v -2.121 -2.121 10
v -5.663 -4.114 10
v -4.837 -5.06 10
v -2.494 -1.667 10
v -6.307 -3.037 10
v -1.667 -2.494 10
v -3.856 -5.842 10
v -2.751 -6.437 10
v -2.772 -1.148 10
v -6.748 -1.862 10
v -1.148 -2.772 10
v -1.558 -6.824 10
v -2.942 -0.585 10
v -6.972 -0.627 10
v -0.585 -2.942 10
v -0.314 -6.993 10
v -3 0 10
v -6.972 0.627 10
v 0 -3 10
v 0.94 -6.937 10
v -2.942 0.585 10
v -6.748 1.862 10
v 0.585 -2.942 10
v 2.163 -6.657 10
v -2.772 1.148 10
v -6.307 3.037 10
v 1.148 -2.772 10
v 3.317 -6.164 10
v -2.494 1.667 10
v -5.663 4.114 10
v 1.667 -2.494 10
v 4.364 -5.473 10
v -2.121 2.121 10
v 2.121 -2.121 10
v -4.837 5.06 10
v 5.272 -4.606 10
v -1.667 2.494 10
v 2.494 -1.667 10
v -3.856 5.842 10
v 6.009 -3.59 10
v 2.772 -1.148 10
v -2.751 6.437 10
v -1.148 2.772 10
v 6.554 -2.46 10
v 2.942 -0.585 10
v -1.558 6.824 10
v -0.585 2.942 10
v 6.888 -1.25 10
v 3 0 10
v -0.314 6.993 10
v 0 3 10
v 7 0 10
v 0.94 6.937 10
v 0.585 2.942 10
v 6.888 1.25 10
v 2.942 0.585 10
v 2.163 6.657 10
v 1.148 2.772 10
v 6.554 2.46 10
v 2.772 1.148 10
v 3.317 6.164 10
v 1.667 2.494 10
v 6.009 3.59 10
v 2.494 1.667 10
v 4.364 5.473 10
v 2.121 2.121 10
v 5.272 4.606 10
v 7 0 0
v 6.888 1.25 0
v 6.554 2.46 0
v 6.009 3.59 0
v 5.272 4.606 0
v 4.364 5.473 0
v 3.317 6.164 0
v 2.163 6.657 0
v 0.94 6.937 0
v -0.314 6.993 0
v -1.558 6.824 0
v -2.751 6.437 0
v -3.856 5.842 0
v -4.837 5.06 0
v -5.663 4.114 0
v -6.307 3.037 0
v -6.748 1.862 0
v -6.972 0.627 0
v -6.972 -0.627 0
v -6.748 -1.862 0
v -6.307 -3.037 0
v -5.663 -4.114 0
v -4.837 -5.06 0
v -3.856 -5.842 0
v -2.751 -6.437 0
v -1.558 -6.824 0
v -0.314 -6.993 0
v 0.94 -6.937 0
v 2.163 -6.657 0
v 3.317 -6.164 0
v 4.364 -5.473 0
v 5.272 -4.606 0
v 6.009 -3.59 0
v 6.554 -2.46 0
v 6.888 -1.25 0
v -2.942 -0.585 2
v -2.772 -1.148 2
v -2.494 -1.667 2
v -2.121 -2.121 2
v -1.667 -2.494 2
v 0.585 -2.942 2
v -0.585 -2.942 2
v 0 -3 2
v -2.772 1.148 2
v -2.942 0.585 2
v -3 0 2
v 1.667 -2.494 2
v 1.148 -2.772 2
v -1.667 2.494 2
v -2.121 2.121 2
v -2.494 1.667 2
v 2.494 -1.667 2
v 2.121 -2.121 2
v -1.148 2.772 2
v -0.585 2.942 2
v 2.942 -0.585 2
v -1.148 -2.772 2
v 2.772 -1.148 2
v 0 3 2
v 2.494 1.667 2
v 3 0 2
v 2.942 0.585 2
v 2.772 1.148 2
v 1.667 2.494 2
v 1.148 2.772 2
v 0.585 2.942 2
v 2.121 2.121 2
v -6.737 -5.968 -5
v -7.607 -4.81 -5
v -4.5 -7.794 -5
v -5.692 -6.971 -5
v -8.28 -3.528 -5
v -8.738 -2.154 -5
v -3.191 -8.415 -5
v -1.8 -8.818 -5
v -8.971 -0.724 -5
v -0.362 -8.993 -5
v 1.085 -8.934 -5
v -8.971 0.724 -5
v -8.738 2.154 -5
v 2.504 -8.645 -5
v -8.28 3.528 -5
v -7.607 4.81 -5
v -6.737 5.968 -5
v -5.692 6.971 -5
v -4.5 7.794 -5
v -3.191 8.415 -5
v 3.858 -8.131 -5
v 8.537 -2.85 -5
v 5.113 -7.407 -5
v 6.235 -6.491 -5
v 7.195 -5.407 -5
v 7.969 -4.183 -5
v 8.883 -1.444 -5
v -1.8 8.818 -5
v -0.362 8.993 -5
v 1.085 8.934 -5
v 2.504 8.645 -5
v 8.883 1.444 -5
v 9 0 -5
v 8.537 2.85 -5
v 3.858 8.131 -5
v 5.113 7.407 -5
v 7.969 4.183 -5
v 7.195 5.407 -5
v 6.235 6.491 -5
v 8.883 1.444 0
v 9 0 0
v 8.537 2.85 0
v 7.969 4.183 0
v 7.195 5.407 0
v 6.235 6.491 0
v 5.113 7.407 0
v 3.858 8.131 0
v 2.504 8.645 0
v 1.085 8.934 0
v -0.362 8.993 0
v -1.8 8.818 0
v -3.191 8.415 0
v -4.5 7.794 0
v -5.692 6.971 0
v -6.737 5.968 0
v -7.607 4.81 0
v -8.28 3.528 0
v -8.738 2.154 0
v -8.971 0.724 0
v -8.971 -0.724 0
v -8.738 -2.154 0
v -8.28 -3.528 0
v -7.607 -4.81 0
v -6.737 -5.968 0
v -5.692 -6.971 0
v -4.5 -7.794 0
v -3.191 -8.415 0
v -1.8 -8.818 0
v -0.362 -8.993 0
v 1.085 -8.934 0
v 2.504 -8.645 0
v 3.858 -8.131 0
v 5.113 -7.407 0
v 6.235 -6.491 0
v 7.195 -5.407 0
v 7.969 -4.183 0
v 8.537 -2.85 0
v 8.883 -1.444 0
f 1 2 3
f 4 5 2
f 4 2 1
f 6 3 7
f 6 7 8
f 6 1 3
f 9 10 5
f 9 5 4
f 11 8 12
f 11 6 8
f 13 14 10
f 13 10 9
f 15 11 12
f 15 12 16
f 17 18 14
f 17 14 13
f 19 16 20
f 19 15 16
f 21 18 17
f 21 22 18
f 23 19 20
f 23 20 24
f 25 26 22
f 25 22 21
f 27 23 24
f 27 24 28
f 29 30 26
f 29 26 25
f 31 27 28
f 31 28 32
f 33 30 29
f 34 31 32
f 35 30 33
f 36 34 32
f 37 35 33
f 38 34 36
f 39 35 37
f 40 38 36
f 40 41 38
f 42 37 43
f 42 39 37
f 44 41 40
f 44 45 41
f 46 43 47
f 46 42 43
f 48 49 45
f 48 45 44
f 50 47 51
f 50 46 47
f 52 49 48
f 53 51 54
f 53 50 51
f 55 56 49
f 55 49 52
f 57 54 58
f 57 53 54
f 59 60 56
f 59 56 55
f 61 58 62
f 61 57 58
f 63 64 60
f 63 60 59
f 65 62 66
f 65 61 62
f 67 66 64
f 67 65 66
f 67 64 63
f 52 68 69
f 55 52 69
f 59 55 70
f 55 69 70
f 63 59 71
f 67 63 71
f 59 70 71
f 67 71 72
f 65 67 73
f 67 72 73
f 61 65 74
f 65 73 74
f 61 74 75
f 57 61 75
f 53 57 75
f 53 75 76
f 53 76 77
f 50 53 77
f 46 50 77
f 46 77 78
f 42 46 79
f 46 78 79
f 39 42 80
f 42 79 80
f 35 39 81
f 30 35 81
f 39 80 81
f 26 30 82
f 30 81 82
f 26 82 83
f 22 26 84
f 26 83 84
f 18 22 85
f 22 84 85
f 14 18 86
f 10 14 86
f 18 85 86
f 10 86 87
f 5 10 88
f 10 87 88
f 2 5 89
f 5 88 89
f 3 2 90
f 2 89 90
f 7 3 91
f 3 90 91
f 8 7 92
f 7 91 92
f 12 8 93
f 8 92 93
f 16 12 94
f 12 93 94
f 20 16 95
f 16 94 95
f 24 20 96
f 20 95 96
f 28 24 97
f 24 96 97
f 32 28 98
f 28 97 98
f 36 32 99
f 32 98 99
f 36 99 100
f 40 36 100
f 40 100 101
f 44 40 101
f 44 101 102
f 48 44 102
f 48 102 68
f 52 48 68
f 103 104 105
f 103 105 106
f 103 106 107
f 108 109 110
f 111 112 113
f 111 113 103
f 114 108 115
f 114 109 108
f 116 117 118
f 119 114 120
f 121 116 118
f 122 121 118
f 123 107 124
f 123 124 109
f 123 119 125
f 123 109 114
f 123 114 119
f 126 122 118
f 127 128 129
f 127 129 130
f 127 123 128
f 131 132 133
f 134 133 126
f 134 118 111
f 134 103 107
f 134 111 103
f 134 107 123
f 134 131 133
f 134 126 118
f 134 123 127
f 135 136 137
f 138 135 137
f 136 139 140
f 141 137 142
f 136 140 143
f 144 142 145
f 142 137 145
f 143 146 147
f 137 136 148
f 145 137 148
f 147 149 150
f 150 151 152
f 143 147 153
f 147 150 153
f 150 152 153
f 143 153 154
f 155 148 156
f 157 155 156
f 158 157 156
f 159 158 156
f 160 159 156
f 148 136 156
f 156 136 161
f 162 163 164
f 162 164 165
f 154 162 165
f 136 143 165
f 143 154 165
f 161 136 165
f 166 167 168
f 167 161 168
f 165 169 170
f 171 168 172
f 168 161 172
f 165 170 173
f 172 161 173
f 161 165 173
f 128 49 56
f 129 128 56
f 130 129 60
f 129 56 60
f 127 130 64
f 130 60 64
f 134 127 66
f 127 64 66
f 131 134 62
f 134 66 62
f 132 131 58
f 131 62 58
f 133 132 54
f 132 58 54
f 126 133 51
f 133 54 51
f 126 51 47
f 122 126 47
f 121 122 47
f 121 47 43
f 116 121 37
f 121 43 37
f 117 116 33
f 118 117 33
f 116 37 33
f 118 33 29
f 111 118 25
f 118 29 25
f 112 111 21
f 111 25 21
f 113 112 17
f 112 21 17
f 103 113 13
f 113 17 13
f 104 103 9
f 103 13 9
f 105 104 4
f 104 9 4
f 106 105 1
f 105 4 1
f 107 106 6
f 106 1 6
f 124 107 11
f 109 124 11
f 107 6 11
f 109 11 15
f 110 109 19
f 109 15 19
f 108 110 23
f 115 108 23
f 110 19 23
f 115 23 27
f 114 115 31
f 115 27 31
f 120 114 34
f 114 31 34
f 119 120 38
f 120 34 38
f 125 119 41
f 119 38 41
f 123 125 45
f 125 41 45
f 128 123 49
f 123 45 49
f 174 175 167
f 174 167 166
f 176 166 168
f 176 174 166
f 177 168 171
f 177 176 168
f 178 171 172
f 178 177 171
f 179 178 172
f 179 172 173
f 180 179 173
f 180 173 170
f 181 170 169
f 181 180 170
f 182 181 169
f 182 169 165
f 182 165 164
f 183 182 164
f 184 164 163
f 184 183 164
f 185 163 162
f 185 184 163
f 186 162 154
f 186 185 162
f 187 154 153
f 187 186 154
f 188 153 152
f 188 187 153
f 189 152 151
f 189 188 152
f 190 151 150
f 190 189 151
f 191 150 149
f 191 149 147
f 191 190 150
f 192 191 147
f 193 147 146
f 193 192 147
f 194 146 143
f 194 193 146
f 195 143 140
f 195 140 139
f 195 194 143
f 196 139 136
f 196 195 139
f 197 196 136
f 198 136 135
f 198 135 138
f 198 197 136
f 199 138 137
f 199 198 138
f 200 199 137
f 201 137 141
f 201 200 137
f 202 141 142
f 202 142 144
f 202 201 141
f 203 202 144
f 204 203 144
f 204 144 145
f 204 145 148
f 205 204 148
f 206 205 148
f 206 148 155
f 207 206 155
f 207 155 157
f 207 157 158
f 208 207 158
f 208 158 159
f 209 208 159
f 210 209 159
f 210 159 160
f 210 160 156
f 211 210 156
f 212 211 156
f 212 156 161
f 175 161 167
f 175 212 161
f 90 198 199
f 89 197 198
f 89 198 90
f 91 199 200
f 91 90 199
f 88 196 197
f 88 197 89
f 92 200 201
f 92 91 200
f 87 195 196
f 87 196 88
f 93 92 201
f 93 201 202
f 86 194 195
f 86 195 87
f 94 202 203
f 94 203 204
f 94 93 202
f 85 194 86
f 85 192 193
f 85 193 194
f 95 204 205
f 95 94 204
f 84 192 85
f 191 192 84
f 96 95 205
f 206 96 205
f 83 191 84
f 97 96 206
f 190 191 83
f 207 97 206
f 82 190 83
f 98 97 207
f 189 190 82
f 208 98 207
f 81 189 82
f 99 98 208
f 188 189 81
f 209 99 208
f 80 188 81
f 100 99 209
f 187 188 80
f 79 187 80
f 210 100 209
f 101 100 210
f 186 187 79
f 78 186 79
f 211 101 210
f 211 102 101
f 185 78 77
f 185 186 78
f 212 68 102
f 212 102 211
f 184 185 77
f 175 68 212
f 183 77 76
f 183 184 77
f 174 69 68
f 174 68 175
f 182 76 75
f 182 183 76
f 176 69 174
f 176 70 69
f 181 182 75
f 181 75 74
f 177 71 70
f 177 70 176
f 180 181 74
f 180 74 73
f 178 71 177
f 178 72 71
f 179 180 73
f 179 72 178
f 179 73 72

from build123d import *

# Parameters (mm, degrees)
F0_R     = 9
F0_R_2   = 7
F1_DEPTH = 5
F2_DEPTH = 10
F3_R     = 3
F4_DEPTH = 8


with BuildPart() as f1:
    # F0 (on Top) → F1 (new body)
    with BuildSketch(Plane.XY):
        Circle(F0_R)
        Circle(F0_R_2, mode=Mode.SUBTRACT)
        Circle(F0_R_2)
    extrude(amount=-F1_DEPTH)

    # F0 (on Top) → F2 (join)
    with BuildSketch(Plane.XY):
        Circle(F0_R_2)
    extrude(amount=F2_DEPTH)

    # F3 (on face) → F4 (cut)
    with BuildSketch(Plane.XY.offset(10)):
        Circle(F3_R)
    extrude(amount=-F4_DEPTH, mode=Mode.SUBTRACT)


solid = f1.part
